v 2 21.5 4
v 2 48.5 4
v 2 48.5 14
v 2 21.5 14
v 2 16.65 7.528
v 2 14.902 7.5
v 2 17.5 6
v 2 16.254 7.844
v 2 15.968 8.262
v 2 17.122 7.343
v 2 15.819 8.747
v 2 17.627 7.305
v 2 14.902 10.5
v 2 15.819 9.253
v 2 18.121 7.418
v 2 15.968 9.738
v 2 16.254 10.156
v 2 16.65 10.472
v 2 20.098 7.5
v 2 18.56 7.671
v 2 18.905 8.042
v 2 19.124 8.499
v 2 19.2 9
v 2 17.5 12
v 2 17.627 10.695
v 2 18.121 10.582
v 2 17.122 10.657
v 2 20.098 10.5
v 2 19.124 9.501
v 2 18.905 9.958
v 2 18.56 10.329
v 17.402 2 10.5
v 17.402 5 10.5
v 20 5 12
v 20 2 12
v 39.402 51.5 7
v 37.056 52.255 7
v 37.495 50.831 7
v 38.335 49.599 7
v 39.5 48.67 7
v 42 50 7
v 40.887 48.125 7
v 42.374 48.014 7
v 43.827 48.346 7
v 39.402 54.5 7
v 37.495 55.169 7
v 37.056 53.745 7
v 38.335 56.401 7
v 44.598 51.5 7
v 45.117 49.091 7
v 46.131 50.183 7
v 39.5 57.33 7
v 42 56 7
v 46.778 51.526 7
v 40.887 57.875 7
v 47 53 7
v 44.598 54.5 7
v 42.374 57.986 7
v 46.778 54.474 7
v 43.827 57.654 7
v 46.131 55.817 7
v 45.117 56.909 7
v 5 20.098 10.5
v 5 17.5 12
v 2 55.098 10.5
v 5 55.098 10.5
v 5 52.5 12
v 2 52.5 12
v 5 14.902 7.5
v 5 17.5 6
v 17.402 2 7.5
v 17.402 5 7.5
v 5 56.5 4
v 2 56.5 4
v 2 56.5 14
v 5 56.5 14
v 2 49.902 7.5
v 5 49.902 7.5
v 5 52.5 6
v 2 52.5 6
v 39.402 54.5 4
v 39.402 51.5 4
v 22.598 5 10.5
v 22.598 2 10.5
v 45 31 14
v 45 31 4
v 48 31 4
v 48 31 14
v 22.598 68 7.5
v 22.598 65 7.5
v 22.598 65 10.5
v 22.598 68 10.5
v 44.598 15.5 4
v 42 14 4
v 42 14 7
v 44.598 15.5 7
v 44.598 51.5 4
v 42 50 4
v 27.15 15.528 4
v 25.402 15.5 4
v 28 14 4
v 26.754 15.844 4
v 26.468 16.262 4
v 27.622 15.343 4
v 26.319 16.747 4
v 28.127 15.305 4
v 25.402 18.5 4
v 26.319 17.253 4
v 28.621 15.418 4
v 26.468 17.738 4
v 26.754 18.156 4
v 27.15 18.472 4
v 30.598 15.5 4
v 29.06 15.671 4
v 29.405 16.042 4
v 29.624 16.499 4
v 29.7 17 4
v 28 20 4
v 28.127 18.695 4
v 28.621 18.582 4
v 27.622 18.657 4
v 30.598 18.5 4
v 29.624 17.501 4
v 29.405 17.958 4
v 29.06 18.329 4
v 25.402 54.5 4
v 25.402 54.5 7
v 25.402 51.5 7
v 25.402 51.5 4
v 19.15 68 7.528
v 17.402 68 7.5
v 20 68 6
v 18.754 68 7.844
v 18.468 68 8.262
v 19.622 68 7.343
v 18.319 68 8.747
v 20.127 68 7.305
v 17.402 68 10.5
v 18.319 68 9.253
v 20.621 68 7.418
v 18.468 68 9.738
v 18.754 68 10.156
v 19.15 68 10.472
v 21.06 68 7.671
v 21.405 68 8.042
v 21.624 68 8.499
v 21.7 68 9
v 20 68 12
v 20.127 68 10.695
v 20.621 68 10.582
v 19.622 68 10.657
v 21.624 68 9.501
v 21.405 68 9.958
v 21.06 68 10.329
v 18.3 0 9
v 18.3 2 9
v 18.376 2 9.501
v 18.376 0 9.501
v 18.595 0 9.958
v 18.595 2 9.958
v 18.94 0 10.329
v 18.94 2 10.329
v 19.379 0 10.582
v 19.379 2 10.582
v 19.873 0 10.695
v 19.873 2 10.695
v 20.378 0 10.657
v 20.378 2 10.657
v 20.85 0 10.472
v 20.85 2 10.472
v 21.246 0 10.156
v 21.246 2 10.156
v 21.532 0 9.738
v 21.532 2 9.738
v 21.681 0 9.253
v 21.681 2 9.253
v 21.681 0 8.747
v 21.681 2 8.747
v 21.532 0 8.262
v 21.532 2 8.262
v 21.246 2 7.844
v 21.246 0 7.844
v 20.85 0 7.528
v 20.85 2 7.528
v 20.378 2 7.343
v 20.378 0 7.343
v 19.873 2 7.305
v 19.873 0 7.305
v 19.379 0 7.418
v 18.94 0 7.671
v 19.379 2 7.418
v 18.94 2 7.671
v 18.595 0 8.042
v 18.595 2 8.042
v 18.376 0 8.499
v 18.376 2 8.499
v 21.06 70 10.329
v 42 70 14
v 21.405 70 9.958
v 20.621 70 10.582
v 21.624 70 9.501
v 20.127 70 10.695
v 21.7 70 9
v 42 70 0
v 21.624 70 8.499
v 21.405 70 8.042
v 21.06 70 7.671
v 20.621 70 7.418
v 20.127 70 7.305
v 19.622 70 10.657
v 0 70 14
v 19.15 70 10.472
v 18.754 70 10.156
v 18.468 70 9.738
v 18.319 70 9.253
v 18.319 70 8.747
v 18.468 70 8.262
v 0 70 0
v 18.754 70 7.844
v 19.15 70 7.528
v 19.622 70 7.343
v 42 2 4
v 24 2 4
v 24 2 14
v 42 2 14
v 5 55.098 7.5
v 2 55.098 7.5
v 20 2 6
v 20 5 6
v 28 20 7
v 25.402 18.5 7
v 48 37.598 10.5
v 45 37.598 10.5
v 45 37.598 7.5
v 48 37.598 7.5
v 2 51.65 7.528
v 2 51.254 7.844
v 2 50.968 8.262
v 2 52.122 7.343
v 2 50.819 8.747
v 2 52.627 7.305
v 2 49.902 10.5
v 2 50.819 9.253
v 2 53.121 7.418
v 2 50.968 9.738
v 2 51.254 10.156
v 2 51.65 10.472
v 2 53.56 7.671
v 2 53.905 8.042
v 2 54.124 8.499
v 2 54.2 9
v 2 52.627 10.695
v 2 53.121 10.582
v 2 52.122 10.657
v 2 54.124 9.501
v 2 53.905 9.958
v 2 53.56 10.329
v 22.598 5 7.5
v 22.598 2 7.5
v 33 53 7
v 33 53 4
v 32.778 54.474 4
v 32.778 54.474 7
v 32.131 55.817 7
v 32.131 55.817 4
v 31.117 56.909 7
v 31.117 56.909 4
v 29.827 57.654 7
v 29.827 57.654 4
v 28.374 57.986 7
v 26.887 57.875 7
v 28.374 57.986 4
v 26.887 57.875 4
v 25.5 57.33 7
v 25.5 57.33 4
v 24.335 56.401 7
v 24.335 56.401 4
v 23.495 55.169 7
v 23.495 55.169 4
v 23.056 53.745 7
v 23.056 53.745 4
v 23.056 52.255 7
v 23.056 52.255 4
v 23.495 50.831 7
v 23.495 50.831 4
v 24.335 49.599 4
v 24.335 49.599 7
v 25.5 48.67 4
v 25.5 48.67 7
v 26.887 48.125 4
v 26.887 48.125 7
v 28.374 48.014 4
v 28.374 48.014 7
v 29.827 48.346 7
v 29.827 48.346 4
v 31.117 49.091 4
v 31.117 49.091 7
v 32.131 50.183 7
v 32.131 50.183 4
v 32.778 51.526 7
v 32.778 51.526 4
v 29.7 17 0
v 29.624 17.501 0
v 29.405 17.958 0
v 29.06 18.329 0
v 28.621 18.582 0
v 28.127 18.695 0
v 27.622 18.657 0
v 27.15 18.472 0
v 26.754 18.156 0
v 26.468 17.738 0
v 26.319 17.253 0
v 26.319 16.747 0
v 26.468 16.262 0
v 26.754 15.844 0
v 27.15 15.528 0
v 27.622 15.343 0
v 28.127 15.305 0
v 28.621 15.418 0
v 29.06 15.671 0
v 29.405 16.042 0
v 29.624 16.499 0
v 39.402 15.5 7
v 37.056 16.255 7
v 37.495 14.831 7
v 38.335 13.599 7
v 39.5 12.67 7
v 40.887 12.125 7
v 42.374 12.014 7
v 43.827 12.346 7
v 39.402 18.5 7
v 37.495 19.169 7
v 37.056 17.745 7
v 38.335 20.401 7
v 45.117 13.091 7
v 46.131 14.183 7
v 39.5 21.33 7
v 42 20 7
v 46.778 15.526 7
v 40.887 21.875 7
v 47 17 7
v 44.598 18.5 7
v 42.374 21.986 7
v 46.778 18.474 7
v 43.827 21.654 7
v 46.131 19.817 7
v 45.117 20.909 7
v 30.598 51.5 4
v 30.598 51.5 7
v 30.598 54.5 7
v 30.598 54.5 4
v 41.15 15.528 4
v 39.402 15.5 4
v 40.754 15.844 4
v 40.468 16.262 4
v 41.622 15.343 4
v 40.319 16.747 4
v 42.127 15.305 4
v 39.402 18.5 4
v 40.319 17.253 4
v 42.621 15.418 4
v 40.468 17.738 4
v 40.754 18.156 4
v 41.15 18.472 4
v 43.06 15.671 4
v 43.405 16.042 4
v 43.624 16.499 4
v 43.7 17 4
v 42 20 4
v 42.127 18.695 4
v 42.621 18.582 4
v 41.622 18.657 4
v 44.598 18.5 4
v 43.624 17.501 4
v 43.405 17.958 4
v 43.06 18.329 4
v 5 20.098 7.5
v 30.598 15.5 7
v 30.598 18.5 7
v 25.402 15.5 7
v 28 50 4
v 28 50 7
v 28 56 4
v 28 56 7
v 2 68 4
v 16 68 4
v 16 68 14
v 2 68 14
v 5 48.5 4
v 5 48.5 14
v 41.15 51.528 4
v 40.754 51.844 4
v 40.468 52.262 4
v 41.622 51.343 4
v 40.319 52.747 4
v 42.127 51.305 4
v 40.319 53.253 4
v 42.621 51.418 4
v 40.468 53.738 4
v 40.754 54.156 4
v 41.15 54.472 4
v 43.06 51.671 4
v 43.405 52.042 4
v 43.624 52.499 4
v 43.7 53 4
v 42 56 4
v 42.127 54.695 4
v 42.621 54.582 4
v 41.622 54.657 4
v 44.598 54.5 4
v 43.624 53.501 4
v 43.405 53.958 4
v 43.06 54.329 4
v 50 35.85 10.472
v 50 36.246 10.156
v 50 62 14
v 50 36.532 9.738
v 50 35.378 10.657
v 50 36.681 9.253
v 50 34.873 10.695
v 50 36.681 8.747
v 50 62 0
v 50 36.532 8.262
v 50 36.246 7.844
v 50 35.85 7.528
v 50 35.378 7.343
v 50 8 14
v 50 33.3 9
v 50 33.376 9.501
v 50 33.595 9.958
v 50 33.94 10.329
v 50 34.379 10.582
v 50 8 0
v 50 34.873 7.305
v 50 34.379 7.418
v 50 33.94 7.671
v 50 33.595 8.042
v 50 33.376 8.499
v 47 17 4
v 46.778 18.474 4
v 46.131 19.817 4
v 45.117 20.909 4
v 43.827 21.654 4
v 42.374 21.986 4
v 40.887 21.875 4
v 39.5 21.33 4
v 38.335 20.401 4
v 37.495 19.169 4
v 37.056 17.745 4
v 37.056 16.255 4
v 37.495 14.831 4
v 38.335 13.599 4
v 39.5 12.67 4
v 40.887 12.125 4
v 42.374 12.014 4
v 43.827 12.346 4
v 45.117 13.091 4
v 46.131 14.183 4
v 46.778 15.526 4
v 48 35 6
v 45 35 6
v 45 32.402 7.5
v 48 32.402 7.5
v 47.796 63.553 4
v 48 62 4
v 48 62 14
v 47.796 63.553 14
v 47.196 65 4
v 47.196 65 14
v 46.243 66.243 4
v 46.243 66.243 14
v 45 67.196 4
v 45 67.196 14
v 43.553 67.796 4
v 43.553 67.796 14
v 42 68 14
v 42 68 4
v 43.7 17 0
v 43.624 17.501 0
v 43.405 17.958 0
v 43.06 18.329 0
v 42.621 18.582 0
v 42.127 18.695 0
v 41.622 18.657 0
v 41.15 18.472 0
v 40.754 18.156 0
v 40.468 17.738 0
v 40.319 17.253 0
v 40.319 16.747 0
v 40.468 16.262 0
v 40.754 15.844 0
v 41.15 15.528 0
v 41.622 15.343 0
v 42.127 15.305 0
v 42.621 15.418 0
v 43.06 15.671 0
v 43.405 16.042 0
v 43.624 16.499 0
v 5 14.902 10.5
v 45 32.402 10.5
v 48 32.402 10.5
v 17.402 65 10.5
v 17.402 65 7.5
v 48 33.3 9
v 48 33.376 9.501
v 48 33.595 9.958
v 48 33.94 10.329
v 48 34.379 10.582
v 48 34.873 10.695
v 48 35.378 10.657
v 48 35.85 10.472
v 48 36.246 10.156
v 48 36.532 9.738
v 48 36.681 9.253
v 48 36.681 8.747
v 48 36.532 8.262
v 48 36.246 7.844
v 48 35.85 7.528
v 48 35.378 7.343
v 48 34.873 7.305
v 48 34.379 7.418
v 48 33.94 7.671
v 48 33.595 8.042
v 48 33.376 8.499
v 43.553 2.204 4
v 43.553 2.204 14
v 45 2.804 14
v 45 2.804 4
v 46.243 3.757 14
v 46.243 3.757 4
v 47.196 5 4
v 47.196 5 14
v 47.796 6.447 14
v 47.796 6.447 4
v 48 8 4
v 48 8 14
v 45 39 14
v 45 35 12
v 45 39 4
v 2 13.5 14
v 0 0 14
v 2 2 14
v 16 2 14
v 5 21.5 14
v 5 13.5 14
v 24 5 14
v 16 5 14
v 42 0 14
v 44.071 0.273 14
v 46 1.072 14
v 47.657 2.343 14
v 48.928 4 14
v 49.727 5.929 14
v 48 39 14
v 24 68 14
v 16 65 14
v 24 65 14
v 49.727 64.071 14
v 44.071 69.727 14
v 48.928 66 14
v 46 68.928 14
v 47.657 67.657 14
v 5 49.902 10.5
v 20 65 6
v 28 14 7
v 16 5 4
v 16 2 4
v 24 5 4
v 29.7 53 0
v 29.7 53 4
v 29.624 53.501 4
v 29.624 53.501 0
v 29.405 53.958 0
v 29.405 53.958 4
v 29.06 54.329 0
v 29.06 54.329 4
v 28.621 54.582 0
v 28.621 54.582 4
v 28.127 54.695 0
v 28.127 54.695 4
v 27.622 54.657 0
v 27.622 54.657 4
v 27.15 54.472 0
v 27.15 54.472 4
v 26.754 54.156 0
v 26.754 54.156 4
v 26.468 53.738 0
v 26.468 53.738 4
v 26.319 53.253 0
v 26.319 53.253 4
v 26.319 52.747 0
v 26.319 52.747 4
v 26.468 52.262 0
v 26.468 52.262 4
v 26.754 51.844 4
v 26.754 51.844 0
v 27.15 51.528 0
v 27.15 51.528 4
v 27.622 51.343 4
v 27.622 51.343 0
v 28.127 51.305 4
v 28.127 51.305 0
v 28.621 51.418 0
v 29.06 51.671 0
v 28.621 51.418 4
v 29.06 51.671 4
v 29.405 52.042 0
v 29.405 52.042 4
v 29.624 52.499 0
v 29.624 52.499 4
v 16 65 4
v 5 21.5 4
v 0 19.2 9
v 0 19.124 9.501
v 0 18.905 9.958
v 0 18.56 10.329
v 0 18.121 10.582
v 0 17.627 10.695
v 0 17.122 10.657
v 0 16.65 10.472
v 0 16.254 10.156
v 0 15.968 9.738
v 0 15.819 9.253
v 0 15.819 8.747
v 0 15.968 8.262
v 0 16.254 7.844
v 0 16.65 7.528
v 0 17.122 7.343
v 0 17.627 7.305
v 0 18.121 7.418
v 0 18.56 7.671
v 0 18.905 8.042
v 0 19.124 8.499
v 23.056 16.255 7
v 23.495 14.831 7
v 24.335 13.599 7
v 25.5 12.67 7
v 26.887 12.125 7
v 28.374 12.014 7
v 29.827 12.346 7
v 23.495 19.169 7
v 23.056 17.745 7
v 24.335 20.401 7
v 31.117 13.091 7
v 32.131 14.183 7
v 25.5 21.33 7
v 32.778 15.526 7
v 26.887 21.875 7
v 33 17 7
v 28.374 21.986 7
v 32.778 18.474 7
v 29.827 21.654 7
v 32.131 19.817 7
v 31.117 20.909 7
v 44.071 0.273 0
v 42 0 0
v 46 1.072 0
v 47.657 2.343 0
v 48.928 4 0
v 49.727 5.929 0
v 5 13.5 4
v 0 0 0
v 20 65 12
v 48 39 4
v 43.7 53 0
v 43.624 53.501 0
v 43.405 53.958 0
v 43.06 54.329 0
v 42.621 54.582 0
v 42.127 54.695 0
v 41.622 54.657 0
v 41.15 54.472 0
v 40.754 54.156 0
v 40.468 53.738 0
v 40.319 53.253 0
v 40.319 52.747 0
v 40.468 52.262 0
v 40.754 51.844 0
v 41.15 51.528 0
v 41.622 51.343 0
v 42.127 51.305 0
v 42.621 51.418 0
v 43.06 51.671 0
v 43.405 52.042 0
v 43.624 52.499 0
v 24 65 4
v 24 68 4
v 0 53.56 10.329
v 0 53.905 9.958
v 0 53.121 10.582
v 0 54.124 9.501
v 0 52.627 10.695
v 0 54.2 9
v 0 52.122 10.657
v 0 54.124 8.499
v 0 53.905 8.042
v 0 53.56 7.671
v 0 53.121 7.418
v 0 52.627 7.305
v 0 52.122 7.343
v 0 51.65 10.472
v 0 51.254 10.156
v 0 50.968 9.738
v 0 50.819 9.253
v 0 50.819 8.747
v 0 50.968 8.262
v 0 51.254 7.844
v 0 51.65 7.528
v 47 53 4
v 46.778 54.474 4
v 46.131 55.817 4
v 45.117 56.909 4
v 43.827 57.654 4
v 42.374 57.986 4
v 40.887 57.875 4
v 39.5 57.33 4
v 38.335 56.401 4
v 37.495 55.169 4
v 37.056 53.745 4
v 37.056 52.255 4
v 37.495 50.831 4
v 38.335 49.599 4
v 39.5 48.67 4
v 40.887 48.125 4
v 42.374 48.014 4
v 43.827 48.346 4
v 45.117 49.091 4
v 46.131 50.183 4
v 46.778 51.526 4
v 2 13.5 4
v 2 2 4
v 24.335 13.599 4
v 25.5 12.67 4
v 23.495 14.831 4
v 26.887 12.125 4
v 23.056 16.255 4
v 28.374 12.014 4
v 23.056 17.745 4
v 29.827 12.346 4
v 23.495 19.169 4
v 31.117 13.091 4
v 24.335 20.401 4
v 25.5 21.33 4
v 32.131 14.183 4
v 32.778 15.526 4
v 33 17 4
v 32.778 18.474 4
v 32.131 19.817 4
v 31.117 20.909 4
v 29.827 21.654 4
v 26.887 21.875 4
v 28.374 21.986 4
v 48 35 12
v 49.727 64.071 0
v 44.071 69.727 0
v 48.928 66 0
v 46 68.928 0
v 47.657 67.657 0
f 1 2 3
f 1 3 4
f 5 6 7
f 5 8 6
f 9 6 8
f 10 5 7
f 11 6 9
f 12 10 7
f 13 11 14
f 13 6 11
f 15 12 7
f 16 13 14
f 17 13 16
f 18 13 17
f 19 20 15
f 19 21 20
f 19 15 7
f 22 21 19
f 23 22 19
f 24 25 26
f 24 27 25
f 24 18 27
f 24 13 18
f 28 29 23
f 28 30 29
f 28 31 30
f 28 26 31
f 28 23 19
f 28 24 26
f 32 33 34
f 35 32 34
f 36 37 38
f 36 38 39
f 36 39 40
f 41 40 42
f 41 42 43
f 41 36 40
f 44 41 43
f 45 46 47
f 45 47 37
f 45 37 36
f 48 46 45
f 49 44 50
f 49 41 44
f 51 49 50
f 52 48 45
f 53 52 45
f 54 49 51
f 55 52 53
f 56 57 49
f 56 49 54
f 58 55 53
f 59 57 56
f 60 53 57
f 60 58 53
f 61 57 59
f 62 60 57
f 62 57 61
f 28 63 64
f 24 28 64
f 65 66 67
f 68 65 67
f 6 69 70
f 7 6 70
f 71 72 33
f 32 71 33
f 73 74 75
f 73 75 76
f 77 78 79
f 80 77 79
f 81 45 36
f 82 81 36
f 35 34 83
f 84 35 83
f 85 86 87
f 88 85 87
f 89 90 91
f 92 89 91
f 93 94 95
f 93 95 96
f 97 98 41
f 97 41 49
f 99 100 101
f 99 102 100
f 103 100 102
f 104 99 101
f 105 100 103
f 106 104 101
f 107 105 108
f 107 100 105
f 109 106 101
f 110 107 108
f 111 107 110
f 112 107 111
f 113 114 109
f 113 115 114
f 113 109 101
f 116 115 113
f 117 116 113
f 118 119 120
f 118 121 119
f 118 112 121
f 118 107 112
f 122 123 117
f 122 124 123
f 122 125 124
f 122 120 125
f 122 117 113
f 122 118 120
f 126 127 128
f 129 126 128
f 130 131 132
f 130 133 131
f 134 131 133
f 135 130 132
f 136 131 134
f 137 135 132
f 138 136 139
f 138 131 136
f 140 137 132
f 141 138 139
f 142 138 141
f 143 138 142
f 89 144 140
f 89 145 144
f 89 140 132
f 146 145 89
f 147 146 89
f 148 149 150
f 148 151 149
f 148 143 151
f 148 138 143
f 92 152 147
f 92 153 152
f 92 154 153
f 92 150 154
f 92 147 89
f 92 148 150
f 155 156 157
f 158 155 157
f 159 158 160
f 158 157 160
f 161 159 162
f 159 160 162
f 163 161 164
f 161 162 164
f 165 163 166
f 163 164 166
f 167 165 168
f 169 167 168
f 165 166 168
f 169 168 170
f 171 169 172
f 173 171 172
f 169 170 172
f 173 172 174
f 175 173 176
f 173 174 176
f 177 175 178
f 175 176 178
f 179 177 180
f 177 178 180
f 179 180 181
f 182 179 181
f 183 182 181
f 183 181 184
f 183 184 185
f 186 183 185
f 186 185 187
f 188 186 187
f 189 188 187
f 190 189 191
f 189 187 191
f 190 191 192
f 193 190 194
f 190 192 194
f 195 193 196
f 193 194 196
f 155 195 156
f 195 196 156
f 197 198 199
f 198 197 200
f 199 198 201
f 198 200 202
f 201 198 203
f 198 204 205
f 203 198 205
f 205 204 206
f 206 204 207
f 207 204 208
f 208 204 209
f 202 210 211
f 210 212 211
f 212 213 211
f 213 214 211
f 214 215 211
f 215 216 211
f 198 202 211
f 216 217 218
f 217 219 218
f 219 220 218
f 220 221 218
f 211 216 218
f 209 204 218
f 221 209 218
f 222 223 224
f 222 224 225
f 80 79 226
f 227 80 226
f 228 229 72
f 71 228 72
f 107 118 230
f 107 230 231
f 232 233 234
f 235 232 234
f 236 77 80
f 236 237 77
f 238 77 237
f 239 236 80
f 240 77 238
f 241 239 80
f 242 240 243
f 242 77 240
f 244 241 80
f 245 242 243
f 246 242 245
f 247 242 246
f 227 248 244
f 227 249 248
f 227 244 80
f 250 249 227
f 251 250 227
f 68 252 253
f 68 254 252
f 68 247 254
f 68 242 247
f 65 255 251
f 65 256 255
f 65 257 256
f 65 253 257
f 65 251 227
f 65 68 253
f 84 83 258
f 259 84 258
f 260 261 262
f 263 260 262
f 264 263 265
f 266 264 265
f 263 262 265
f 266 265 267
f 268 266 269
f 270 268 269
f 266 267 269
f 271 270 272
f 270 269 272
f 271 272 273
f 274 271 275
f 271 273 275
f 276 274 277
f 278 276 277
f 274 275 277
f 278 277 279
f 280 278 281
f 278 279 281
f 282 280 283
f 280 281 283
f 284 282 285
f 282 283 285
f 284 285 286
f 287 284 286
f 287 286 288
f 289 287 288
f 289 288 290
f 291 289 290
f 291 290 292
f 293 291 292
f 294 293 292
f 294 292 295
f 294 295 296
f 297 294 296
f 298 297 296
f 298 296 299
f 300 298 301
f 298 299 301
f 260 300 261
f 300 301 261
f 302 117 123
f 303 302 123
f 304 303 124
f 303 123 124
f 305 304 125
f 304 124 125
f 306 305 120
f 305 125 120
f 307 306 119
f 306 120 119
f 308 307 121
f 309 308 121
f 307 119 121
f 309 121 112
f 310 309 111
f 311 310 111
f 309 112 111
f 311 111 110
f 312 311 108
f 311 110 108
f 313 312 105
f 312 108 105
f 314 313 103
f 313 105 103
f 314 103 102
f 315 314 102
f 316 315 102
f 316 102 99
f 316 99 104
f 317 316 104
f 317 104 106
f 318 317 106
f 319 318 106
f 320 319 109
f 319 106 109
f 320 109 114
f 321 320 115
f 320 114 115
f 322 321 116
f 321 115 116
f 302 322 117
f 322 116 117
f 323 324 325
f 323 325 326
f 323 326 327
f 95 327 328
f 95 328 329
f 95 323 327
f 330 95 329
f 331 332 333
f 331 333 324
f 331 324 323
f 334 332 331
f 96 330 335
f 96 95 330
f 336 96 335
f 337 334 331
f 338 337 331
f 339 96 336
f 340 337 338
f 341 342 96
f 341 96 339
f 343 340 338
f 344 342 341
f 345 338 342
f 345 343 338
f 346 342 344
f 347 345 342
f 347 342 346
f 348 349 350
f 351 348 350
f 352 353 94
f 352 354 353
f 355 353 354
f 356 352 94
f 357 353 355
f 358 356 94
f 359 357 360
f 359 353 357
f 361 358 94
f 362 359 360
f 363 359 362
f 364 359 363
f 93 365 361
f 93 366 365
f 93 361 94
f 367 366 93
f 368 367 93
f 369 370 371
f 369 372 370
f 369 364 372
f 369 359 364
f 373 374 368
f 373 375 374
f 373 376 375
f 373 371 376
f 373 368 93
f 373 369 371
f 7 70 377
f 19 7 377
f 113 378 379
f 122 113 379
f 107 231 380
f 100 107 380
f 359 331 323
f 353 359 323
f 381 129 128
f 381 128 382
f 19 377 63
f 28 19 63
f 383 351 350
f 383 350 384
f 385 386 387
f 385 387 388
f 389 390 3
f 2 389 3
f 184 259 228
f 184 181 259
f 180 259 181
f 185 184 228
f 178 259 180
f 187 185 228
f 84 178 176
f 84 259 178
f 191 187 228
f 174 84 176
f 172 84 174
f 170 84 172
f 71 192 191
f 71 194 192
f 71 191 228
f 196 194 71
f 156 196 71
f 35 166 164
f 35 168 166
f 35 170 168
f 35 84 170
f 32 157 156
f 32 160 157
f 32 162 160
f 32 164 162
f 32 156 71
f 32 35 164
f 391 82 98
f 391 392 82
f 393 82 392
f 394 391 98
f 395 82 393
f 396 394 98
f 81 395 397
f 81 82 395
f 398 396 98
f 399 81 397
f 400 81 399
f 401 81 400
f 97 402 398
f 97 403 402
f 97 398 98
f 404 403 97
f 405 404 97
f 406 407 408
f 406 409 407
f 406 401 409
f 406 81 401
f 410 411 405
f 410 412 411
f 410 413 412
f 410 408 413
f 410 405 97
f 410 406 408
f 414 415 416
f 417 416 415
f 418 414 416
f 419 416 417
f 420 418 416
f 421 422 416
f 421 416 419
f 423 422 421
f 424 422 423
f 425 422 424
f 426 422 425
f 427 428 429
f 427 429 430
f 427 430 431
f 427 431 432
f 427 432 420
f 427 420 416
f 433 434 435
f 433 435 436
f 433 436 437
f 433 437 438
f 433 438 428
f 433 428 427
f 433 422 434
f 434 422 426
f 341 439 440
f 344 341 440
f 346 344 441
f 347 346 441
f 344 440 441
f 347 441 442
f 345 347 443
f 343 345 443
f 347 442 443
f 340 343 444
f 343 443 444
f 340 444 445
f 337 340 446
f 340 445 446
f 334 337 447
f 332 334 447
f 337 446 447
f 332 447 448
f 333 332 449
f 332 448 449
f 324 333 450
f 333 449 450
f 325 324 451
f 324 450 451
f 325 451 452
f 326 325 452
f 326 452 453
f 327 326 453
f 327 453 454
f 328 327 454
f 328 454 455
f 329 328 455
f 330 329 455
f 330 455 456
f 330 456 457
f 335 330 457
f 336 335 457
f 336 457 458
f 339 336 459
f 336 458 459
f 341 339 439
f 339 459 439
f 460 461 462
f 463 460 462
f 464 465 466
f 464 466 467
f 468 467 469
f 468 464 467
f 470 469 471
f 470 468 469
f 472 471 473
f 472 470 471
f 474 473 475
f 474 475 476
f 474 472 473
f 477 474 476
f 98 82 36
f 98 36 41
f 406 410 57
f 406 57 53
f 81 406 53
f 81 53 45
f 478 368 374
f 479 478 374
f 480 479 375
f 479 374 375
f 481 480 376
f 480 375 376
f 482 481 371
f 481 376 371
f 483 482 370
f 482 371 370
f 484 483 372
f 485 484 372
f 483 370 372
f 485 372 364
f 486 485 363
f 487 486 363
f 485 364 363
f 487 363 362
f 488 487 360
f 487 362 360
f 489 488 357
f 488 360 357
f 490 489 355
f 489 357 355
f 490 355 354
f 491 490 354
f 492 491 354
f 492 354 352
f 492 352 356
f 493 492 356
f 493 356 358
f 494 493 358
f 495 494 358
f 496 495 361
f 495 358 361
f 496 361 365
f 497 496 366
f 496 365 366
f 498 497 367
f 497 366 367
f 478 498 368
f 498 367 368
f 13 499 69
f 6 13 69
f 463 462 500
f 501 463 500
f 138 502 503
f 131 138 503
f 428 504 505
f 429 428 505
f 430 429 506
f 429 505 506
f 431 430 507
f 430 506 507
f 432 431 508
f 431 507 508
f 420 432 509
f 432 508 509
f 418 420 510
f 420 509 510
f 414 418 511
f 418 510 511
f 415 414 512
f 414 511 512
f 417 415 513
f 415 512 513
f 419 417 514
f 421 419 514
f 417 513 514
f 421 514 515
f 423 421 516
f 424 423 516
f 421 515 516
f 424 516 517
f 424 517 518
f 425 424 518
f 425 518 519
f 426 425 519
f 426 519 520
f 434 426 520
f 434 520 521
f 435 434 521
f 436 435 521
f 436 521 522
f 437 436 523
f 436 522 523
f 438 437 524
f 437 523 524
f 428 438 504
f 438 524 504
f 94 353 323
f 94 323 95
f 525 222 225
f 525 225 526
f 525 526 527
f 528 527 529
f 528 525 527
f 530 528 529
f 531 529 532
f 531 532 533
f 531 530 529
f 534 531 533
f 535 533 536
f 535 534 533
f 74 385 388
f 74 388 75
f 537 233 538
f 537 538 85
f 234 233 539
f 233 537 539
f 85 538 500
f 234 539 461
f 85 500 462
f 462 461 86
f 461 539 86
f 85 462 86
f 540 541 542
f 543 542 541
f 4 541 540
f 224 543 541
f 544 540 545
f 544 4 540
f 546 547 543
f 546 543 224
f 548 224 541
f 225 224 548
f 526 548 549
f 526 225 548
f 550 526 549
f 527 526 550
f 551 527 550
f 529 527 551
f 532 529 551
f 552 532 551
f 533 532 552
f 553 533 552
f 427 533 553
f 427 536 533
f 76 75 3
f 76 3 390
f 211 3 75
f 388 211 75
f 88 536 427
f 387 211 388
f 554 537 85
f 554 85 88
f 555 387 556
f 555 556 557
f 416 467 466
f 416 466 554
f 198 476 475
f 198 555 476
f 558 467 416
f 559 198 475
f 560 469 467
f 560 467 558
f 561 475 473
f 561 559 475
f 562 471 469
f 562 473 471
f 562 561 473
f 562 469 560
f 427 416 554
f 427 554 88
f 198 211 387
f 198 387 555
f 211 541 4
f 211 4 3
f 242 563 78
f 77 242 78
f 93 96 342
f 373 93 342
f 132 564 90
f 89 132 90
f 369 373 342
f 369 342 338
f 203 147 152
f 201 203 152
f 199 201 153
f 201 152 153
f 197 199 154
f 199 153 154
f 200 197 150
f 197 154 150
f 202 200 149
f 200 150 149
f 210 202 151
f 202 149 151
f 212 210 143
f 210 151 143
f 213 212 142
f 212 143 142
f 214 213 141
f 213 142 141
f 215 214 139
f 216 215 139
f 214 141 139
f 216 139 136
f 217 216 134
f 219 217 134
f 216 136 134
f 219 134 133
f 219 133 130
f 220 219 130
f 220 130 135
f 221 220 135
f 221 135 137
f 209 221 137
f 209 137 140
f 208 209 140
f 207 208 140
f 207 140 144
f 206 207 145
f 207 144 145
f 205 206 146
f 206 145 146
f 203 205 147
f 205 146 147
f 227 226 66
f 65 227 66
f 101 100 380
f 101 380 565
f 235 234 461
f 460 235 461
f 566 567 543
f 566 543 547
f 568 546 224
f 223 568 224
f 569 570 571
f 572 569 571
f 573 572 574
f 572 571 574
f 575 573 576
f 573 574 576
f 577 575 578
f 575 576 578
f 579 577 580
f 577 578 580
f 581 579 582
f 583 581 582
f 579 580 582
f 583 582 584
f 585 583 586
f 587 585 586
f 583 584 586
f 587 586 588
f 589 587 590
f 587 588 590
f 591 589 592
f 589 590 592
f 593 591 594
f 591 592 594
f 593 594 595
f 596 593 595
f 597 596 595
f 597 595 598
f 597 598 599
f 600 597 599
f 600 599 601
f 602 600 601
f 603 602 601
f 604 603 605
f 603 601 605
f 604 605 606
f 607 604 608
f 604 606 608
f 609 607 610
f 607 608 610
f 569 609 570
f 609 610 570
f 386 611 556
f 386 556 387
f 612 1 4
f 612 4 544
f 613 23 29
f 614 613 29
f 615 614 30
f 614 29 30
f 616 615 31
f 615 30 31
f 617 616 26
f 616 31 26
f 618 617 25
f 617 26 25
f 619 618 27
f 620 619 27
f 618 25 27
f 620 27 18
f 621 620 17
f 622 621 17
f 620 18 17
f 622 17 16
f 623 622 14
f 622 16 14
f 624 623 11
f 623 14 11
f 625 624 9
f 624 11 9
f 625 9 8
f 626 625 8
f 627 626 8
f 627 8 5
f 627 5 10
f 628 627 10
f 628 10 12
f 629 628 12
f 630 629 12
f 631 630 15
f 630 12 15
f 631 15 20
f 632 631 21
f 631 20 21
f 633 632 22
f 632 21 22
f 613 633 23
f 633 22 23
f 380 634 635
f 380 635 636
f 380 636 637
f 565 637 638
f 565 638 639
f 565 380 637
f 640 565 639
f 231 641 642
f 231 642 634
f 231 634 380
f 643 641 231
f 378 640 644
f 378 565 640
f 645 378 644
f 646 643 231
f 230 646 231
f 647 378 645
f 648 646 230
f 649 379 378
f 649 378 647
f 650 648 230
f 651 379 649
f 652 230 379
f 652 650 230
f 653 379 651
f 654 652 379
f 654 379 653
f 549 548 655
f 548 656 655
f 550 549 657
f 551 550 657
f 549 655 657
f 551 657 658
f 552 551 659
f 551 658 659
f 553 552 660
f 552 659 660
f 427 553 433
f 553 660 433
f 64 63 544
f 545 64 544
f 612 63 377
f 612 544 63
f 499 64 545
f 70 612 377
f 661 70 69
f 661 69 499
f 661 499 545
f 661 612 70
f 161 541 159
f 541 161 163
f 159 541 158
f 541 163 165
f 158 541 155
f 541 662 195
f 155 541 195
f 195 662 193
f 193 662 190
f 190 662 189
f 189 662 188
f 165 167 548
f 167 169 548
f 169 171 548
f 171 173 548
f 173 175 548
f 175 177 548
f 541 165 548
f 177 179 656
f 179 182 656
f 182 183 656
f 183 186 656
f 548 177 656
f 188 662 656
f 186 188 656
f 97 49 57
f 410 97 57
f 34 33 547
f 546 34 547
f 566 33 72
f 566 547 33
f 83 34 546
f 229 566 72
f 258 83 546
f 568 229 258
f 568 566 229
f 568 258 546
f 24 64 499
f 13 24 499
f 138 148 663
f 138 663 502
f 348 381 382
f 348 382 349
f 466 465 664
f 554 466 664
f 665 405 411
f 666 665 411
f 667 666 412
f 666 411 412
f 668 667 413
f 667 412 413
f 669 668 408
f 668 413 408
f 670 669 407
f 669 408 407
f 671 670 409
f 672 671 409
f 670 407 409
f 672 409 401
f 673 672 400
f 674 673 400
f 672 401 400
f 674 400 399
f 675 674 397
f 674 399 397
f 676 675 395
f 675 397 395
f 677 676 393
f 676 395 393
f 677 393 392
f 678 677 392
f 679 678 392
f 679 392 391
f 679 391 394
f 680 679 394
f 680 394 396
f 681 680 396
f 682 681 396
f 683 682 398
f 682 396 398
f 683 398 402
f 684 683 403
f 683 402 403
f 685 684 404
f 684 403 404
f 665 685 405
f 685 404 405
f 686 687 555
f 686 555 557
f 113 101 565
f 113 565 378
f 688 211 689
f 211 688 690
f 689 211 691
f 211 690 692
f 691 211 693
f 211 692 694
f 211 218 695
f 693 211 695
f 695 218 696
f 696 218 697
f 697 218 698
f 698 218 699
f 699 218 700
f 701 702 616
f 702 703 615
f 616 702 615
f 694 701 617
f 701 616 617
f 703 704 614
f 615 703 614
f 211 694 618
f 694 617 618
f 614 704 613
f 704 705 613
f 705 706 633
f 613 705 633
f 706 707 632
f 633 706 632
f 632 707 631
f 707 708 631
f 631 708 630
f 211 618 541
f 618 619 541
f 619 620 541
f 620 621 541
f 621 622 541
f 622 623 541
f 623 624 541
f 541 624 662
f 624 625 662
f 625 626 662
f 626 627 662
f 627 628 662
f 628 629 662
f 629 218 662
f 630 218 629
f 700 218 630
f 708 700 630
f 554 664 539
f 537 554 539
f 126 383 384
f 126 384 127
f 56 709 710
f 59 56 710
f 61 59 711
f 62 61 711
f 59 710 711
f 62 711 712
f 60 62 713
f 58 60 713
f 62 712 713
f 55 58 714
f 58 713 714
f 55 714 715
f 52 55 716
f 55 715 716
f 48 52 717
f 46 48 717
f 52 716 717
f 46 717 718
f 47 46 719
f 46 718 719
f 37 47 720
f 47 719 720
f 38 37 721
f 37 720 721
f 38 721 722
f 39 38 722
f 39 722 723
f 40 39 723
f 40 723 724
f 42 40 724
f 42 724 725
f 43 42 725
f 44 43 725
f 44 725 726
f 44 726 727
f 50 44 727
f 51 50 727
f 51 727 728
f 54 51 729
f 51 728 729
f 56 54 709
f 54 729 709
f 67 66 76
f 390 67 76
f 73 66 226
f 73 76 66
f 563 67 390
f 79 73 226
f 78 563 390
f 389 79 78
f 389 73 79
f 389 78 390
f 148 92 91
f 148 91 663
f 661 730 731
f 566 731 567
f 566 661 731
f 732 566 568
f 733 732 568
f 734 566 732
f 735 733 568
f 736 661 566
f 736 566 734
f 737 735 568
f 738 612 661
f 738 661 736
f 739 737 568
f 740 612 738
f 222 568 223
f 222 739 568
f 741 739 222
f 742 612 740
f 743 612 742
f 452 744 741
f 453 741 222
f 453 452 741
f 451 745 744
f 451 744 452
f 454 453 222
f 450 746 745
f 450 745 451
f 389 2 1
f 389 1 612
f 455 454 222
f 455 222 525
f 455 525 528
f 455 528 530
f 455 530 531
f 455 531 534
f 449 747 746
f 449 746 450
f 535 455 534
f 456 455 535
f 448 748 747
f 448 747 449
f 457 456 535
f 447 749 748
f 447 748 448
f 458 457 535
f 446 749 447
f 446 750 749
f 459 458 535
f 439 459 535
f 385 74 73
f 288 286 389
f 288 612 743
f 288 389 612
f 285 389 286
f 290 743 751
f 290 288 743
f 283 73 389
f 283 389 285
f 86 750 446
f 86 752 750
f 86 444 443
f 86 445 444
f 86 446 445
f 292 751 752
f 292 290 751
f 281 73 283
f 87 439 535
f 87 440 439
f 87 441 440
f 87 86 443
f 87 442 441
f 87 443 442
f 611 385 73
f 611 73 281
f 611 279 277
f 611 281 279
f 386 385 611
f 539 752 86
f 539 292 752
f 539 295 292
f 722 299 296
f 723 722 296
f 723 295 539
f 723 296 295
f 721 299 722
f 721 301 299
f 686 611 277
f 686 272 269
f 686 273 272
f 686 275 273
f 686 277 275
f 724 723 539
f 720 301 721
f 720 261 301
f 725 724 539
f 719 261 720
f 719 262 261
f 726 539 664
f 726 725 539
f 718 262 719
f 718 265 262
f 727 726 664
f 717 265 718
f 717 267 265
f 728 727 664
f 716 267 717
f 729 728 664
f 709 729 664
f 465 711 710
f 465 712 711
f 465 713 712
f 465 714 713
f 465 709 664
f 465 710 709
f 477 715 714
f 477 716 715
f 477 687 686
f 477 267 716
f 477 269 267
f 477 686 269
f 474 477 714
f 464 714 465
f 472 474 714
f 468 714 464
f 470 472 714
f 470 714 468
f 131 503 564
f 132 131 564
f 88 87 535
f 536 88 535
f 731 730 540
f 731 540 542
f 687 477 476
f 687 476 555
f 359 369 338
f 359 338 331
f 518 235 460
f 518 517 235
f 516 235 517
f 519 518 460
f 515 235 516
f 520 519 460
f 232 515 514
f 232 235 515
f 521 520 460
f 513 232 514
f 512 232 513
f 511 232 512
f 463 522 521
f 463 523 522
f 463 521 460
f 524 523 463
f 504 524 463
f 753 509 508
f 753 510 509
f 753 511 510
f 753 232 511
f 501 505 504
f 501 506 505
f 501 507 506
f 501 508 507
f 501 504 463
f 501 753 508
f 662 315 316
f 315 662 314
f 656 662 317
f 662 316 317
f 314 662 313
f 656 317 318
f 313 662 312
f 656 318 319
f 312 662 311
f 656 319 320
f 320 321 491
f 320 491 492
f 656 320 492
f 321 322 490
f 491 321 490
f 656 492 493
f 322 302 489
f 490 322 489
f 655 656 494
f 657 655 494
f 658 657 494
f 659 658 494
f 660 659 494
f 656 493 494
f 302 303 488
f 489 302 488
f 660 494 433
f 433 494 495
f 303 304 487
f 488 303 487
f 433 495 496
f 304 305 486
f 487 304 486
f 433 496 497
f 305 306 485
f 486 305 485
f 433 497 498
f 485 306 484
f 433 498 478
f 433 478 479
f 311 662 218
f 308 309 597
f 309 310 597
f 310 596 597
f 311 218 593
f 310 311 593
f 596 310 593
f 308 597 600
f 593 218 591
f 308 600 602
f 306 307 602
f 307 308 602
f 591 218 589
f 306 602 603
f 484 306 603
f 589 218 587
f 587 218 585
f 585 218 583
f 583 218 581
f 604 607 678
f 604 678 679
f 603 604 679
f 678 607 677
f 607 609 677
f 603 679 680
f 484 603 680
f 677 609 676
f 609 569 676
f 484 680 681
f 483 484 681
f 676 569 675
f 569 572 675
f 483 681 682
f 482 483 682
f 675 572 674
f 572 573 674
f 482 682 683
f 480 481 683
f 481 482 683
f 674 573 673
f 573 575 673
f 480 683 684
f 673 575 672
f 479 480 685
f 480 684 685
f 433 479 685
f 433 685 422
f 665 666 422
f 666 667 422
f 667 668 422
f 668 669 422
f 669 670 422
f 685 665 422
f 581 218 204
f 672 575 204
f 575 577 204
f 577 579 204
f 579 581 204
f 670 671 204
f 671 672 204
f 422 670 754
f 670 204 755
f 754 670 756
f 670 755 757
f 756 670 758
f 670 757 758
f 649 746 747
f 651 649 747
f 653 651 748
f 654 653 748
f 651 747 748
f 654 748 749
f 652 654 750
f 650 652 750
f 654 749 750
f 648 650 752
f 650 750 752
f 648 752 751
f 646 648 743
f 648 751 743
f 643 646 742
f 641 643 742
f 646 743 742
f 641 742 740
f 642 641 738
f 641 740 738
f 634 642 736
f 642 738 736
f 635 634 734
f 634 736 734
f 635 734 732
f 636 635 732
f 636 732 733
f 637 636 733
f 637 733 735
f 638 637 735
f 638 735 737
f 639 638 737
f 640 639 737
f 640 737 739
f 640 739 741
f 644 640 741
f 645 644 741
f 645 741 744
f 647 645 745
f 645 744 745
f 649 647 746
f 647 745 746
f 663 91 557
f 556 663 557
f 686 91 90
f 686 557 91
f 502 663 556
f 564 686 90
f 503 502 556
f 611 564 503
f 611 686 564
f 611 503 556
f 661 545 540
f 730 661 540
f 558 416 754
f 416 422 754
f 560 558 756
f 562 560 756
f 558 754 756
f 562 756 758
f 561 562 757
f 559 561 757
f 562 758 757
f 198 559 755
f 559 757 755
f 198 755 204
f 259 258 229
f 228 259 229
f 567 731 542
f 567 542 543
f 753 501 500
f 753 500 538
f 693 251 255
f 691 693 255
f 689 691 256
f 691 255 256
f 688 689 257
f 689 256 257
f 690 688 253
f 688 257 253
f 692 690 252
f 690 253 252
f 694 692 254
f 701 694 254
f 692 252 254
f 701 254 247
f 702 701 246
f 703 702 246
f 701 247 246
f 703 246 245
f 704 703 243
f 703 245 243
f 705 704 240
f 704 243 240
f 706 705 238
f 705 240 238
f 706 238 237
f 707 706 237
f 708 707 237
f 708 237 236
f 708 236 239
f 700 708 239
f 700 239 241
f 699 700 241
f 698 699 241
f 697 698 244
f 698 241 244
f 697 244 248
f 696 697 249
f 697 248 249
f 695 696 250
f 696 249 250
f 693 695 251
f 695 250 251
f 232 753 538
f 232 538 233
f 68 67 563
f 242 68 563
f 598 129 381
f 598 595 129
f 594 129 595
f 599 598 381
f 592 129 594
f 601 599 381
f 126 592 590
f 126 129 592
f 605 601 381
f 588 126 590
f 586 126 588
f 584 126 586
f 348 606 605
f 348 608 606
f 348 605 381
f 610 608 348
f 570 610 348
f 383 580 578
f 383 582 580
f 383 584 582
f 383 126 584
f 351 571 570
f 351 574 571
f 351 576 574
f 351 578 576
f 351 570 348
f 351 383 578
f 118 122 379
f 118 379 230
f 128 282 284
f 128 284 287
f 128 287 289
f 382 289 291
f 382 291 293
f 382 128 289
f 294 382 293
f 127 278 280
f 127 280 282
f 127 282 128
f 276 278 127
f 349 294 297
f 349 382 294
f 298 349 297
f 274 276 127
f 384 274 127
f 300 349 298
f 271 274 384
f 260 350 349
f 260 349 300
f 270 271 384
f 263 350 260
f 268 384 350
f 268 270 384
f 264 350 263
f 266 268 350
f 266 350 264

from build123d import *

# Parameters (mm, degrees)
PAD_DEPTH       = 4
PAD001_DEPTH    = 10
SKETCH002_R     = 5
PAD002_DEPTH    = 3
POCKET_DEPTH    = 3
SKETCH004_R     = 1.7
POCKET001_DEPTH = 4
POCKET002_DEPTH = 3
SKETCH006_R     = 1.7
POCKET003_DEPTH = 2
POCKET004_DEPTH = 3
SKETCH008_R     = 1.7
POCKET005_DEPTH = 2
POCKET006_DEPTH = 3
SKETCH010_R     = 1.7
POCKET007_DEPTH = 2
POCKET008_DEPTH = 3
SKETCH012_R     = 1.7
POCKET009_DEPTH = 2


with BuildPart() as part:
    # Sketch → Pad (new body)
    with BuildSketch(Plane.XY):
        with BuildLine():
            Line((0, 0), (42, 0))
            ThreePointArc((42, 0), (47.656854, 2.343146), (50, 8))
            Line((50, 62), (50, 8))
            ThreePointArc((50, 62), (47.656854, 67.656854), (42, 70))
            Line((42, 70), (0, 70))
            Line((0, 70), (0, 0))
        make_face()
    extrude(amount=PAD_DEPTH)

    # Sketch001 → Pad001 (new body)
    with BuildSketch(Plane.XY.offset(4)):
        with BuildLine():
            Line((0, 0), (42, 0))
            ThreePointArc((42, 0), (47.656854, 2.343146), (50, 8))
            Line((50, 62), (50, 8))
            ThreePointArc((50, 62), (47.656854, 67.656854), (42, 70))
            Line((42, 70), (0, 70))
            Line((0, 70), (0, 0))
        make_face()
        with BuildLine():
            ThreePointArc((48, 62), (46.242641, 66.242641), (42, 68))
            Line((42, 68), (24, 68))
            Line((24, 68), (24, 65))
            Line((24, 65), (16, 65))
            Line((16, 65), (16, 68))
            Line((16, 68), (2, 68))
            Line((2, 68), (2, 56.5))
            Line((2, 56.5), (5, 56.5))
            Line((5, 56.5), (5, 48.5))
            Line((5, 48.5), (2, 48.5))
            Line((2, 48.5), (2, 21.5))
            Line((2, 21.5), (5, 21.5))
            Line((5, 21.5), (5, 13.5))
            Line((5, 13.5), (2, 13.5))
            Line((2, 13.5), (2, 2))
            Line((2, 2), (16, 2))
            Line((16, 2), (16, 5))
            Line((16, 5), (24, 5))
            Line((24, 5), (24, 2))
            Line((24, 2), (42, 2))
            ThreePointArc((42, 2), (46.242641, 3.757359), (48, 8))
            Line((48, 31), (48, 8))
            Line((45, 31), (48, 31))
            Line((45, 39), (45, 31))
            Line((48, 39), (45, 39))
            Line((48, 62), (48, 39))
        make_face(mode=Mode.SUBTRACT)
    extrude(amount=PAD001_DEPTH)

    # Sketch002 → Pad002 (new body)
    with BuildSketch(Plane.XY.offset(4)):
        with Locations((28, 53)):
            Circle(SKETCH002_R)
        with Locations((42, 53)):
            Circle(SKETCH002_R)
        with Locations((28, 17)):
            Circle(SKETCH002_R)
        with Locations((42, 17)):
            Circle(SKETCH002_R)
    extrude(amount=PAD002_DEPTH)

    # Sketch003 → Pocket (cut)
    with BuildSketch(Plane.XY.offset(7)):
        Polygon((28, 50), (30.598076, 51.5), (30.598076, 54.5), (28, 56), (25.401924, 54.5), (25.401924, 51.5), align=None)
        Polygon((30.598076, 15.5), (30.598076, 18.5), (28, 20), (25.401924, 18.5), (25.401924, 15.5), (28, 14), align=None)
        Polygon((44.598076, 51.5), (44.598076, 54.5), (42, 56), (39.401924, 54.5), (39.401924, 51.5), (42, 50), align=None)
        Polygon((44.598076, 15.5), (44.598076, 18.5), (42, 20), (39.401924, 18.5), (39.401924, 15.5), (42, 14), align=None)
    extrude(amount=-POCKET_DEPTH, mode=Mode.SUBTRACT)

    # Sketch004 → Pocket001 (cut)
    with BuildSketch(Plane.XY.offset(4)):
        with Locations((28, 53)):
            Circle(SKETCH004_R)
        with Locations((42, 53)):
            Circle(SKETCH004_R)
        with Locations((28, 17)):
            Circle(SKETCH004_R)
        with Locations((42, 17)):
            Circle(SKETCH004_R)
    extrude(amount=-POCKET001_DEPTH, mode=Mode.SUBTRACT)

    # Sketch005 → Pocket002 (cut)
    with BuildSketch(Plane.YZ.offset(5)):
        Polygon((20.098076, 7.5), (20.098076, 10.5), (17.5, 12), (14.901924, 10.5), (14.901924, 7.5), (17.5, 6), align=None)
        Polygon((55.098076, 7.5), (55.098076, 10.5), (52.5, 12), (49.901924, 10.5), (49.901924, 7.5), (52.5, 6), align=None)
    extrude(amount=-POCKET002_DEPTH, mode=Mode.SUBTRACT)

    # Sketch006 → Pocket003 (cut)
    with BuildSketch(Plane.YZ.offset(2)):
        with Locations((17.5, 9)):
            Circle(SKETCH006_R)
        with Locations((52.5, 9)):
            Circle(SKETCH006_R)
    extrude(amount=-POCKET003_DEPTH, mode=Mode.SUBTRACT)

    # Sketch007 → Pocket004 (cut)
    with BuildSketch(Plane.XZ.offset(-65)):
        Polygon((22.598076, 7.5), (22.598076, 10.5), (20, 12), (17.401924, 10.5), (17.401924, 7.5), (20, 6), align=None)
    extrude(amount=-POCKET004_DEPTH, mode=Mode.SUBTRACT)

    # Sketch008 → Pocket005 (cut)
    with BuildSketch(Plane.XZ.offset(-68)):
        with Locations((20, 9)):
            Circle(SKETCH008_R)
    extrude(amount=-POCKET005_DEPTH, mode=Mode.SUBTRACT)

    # Sketch009 → Pocket006 (cut)
    with BuildSketch(Plane(origin=(45, 0, 0), x_dir=(0, -1, 0), z_dir=(-1, 0, 0))):
        Polygon((-37.598076, 7.5), (-35, 6), (-32.401924, 7.5), (-32.401924, 10.5), (-35, 12), (-37.598076, 10.5), align=None)
    extrude(amount=-POCKET006_DEPTH, mode=Mode.SUBTRACT)

    # Sketch010 → Pocket007 (cut)
    with BuildSketch(Plane(origin=(48, 0, 0), x_dir=(0, -1, 0), z_dir=(-1, 0, 0))):
        with Locations((-35, 9)):
            Circle(SKETCH010_R)
    extrude(amount=-POCKET007_DEPTH, mode=Mode.SUBTRACT)

    # Sketch011 → Pocket008 (cut)
    with BuildSketch(Plane(origin=(0, 5, 0), x_dir=(-1, 0, 0), z_dir=(0, 1, 0))):
        Polygon((-17.401924, 7.5), (-17.401924, 10.5), (-20, 12), (-22.598076, 10.5), (-22.598076, 7.5), (-20, 6), align=None)
    extrude(amount=-POCKET008_DEPTH, mode=Mode.SUBTRACT)

    # Sketch012 → Pocket009 (cut)
    with BuildSketch(Plane(origin=(0, 2, 0), x_dir=(-1, 0, 0), z_dir=(0, 1, 0))):
        with Locations((-20, 9)):
            Circle(SKETCH012_R)
    extrude(amount=-POCKET009_DEPTH, mode=Mode.SUBTRACT)


solid = part.part
